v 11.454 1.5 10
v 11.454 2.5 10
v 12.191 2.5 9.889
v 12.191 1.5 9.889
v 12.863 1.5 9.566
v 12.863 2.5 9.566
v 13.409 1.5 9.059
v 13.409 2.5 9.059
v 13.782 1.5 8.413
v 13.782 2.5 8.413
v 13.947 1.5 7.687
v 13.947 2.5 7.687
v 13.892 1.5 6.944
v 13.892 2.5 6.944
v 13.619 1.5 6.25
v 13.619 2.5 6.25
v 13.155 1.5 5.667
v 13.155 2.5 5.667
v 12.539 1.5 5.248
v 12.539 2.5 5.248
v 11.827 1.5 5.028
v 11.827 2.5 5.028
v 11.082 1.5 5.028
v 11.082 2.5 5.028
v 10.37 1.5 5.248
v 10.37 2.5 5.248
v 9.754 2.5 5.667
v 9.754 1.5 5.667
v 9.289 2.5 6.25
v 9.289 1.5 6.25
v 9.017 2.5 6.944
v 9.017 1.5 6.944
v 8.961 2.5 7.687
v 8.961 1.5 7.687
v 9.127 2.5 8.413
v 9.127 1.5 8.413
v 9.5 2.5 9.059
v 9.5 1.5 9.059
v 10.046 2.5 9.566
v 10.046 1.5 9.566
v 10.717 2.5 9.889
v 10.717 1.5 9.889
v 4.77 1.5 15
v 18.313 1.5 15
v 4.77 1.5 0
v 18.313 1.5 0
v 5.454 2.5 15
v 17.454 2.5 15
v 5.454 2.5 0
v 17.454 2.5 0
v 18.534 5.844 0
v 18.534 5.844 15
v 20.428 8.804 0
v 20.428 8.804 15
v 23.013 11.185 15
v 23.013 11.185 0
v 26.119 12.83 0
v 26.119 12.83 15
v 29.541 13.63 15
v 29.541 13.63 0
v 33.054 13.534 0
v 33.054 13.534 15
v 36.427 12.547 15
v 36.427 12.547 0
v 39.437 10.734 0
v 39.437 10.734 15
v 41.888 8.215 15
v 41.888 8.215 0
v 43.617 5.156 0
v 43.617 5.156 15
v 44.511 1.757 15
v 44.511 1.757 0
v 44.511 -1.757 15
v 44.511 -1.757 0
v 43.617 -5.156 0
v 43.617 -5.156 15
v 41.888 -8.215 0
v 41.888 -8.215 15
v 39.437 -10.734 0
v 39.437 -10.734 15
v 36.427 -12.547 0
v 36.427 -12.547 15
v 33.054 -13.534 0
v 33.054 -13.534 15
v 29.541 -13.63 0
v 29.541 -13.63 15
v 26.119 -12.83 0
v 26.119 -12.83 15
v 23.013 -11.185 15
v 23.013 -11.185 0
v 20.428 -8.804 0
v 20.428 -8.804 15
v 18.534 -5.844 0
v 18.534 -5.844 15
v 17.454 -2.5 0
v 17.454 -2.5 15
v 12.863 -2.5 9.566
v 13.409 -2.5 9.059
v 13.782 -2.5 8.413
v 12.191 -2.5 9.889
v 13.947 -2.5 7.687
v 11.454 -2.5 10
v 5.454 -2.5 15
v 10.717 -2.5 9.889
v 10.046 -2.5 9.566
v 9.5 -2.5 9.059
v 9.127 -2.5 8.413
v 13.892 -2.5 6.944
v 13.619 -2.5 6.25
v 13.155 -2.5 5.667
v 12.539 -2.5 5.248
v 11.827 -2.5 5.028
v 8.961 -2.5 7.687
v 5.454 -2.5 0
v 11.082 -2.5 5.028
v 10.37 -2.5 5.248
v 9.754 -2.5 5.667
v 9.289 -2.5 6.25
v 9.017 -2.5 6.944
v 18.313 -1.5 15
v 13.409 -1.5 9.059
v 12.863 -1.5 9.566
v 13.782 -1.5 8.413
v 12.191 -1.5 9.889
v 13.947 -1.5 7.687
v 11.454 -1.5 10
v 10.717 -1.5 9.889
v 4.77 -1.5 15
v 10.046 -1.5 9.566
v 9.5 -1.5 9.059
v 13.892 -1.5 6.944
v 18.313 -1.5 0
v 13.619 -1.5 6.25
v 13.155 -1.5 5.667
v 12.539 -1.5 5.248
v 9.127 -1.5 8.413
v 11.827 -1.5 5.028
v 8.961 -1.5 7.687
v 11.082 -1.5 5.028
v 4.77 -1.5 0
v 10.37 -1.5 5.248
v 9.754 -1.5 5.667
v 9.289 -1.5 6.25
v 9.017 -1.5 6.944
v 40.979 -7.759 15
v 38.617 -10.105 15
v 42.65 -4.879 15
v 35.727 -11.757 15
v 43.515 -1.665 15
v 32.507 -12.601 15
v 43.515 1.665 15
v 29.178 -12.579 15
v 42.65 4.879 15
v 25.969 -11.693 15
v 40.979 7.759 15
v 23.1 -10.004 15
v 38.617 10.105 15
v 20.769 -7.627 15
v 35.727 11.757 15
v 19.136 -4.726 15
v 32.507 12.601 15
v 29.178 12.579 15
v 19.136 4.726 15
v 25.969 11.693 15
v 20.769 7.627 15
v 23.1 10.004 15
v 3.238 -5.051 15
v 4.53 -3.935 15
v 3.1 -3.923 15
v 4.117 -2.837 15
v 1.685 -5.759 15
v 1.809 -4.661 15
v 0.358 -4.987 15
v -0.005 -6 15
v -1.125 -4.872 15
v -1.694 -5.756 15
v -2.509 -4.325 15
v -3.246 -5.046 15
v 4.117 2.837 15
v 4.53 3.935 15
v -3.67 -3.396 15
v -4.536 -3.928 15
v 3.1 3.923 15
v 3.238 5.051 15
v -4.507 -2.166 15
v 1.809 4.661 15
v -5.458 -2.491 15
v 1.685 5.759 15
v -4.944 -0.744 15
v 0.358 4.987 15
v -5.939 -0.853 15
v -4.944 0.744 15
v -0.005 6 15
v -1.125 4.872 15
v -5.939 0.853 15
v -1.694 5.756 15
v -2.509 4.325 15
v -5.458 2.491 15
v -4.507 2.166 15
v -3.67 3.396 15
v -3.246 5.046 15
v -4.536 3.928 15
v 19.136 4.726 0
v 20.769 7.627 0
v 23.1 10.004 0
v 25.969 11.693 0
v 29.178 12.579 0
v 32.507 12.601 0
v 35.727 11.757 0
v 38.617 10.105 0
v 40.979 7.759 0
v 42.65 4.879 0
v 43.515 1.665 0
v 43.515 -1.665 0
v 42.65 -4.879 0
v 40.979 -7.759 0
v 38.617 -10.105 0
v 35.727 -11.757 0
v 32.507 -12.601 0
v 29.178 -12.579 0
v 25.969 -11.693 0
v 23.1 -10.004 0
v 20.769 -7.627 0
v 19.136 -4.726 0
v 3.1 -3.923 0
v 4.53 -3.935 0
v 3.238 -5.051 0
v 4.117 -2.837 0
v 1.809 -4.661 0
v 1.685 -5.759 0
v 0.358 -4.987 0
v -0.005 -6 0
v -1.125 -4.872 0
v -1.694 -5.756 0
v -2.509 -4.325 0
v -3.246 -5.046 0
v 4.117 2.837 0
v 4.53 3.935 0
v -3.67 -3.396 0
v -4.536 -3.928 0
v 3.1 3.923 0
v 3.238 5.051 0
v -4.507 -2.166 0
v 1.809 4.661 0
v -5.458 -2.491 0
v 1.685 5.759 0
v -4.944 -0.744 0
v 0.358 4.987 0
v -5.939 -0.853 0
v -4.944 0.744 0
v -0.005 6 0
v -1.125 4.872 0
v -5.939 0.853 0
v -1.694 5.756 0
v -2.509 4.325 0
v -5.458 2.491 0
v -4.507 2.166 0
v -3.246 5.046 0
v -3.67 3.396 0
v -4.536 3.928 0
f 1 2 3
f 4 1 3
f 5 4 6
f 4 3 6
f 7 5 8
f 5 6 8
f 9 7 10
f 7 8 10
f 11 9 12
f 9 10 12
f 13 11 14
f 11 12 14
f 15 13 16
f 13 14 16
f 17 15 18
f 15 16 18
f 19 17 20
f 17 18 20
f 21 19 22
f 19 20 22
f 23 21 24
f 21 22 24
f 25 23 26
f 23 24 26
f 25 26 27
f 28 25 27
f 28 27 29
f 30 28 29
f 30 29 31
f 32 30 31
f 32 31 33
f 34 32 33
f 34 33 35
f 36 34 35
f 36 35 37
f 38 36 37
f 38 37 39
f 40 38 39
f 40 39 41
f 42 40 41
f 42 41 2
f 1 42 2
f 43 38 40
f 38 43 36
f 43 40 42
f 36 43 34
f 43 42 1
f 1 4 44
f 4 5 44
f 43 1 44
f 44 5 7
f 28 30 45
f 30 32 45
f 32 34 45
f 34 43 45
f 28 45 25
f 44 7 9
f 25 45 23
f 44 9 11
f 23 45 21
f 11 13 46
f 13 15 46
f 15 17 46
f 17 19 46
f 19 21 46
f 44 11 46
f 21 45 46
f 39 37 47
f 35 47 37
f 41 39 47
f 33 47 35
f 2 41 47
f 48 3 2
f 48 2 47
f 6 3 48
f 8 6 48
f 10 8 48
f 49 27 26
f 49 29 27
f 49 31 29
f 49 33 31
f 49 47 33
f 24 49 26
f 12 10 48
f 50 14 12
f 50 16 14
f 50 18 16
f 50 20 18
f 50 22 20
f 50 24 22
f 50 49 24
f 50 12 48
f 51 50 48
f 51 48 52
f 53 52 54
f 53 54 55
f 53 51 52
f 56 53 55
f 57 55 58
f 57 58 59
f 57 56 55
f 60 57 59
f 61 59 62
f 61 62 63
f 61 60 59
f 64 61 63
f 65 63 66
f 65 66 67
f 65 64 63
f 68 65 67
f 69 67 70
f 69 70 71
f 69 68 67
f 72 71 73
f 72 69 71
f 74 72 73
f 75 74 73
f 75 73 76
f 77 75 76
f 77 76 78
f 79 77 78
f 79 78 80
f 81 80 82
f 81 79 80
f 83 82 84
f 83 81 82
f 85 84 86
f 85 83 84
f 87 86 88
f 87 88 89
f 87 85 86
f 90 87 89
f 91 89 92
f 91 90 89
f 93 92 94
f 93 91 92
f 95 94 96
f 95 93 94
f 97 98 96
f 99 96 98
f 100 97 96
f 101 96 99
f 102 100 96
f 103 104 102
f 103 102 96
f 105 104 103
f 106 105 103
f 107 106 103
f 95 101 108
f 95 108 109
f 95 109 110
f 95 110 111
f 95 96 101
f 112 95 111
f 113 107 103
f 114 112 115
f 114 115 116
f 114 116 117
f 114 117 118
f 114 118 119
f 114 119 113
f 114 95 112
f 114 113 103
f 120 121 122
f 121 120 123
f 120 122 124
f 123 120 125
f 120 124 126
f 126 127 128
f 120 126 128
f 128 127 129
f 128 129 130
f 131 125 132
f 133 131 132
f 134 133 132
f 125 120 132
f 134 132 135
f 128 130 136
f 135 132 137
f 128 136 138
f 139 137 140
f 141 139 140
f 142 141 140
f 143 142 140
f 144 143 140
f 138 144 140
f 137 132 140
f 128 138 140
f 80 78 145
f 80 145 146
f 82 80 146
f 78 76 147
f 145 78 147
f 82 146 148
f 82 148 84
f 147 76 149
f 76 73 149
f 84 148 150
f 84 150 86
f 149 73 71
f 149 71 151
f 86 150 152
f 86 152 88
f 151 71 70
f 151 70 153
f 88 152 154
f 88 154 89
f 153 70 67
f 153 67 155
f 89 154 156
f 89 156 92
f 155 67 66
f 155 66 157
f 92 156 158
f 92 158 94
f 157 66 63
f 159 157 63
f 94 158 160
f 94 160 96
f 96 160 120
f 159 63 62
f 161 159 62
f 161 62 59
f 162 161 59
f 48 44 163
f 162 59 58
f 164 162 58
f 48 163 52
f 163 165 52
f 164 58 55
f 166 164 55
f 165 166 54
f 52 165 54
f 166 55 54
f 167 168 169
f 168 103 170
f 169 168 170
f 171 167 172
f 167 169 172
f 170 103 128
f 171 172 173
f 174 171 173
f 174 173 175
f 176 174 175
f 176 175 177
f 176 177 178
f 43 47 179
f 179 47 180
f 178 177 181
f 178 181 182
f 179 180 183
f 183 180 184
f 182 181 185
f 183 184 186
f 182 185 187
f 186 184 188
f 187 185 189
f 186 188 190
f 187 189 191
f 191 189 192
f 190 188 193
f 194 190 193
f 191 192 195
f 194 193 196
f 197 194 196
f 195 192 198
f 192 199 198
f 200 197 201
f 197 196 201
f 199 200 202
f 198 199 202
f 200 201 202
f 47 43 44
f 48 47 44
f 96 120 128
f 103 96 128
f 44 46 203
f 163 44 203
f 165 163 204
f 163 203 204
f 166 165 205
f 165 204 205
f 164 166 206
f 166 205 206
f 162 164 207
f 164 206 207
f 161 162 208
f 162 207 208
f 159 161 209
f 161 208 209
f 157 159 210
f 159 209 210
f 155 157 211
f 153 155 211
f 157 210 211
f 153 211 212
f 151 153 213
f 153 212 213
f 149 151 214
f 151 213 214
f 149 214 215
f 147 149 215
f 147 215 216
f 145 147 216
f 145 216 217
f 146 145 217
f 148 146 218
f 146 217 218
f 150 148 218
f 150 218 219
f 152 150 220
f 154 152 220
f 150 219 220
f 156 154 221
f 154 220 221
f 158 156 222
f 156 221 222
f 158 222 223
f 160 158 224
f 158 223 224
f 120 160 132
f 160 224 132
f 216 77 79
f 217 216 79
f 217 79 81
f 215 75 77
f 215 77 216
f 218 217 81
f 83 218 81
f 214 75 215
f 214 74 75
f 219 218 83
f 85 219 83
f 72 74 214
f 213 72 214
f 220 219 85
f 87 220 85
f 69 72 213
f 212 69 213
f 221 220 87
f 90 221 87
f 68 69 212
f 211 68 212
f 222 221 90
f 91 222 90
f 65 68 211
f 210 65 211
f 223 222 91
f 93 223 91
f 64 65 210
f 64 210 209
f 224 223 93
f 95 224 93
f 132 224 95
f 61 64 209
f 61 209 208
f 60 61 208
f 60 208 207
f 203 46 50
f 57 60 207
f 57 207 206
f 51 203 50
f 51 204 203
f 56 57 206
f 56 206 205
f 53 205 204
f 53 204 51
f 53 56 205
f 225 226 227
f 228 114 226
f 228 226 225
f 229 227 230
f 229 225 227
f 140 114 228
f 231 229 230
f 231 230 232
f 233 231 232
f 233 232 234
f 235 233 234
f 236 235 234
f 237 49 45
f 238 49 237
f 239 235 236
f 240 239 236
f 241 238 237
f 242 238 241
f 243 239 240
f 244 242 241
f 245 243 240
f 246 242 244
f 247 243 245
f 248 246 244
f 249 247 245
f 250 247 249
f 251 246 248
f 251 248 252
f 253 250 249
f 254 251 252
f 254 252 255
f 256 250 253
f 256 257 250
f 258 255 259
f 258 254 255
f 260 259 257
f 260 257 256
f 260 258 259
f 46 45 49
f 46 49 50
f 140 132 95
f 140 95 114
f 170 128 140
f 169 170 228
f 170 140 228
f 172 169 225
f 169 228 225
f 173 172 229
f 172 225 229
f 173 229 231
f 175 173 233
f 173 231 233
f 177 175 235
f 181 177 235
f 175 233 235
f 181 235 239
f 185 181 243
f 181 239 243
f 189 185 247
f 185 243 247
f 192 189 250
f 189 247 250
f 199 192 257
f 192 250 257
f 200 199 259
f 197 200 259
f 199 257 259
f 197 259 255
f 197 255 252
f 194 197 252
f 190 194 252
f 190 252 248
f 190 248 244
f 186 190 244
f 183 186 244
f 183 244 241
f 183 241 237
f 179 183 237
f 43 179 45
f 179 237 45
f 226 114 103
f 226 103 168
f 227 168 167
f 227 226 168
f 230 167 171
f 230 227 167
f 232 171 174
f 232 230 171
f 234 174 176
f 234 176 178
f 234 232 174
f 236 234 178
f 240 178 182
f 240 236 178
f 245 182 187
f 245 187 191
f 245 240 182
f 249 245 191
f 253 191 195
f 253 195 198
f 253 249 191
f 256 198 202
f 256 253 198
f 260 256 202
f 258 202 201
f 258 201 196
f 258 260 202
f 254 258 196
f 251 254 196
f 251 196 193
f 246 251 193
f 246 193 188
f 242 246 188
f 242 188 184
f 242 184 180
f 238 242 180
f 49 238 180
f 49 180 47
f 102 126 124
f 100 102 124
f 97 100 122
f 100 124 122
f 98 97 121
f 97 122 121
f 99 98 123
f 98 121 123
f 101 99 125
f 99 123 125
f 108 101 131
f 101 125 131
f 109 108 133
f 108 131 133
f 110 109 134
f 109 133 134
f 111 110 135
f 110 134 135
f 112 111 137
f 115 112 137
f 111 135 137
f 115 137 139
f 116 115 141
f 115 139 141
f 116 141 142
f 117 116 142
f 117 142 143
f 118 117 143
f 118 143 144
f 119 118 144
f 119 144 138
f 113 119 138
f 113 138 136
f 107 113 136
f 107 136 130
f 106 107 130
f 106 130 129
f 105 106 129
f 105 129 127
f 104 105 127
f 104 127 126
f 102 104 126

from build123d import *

# Parameters (mm, degrees)
SALIENTE_EXTRUIR1_DEPTH = 15
CROQUIS2_R              = 2.5
CORTAR_EXTRUIR1_DEPTH   = 15


with BuildPart() as part:
    # Croquis1 → Saliente-Extruir1 (new body)
    with BuildSketch(Plane.XY):
        with BuildLine():
            Line((5.454356057, 2.5), (17.454356057, 2.5))
            ThreePointArc((17.454356057, 2.5), (44.62432265, 0), (17.454356057, -2.5))
            Line((17.454356057, -2.5), (13.54145622, -2.5))
            Line((13.54145622, -2.5), (9.54145622, -2.5))
            Line((9.54145622, -2.5), (5.454356057, -2.5))
            ThreePointArc((5.454356057, -2.5), (-6, 0), (5.454356057, 2.5))
        make_face()
        with BuildLine():
            Line((4.769696007, 1.5), (18.313216433, 1.5))
            ThreePointArc((18.313216433, 1.5), (43.62432265, 0), (18.313216433, -1.5))
            Line((18.313216433, -1.5), (13.54145622, -1.5))
            Line((13.54145622, -1.5), (9.54145622, -1.5))
            Line((9.54145622, -1.5), (4.769696007, -1.5))
            ThreePointArc((4.769696007, -1.5), (-5, 0), (4.769696007, 1.5))
        make_face(mode=Mode.SUBTRACT)
    extrude(amount=SALIENTE_EXTRUIR1_DEPTH)

    # Croquis2 → Cortar-Extruir1 (cut)
    with BuildSketch(Plane(origin=(0, 2.5, 0), x_dir=(1, 0, 0), z_dir=(0, 1, 0))):
        with Locations(Location((11.454356057, -7.5, 0), (0, 0, 270))):
            Circle(CROQUIS2_R)
    extrude(amount=-CORTAR_EXTRUIR1_DEPTH, mode=Mode.SUBTRACT)


solid = part.part
